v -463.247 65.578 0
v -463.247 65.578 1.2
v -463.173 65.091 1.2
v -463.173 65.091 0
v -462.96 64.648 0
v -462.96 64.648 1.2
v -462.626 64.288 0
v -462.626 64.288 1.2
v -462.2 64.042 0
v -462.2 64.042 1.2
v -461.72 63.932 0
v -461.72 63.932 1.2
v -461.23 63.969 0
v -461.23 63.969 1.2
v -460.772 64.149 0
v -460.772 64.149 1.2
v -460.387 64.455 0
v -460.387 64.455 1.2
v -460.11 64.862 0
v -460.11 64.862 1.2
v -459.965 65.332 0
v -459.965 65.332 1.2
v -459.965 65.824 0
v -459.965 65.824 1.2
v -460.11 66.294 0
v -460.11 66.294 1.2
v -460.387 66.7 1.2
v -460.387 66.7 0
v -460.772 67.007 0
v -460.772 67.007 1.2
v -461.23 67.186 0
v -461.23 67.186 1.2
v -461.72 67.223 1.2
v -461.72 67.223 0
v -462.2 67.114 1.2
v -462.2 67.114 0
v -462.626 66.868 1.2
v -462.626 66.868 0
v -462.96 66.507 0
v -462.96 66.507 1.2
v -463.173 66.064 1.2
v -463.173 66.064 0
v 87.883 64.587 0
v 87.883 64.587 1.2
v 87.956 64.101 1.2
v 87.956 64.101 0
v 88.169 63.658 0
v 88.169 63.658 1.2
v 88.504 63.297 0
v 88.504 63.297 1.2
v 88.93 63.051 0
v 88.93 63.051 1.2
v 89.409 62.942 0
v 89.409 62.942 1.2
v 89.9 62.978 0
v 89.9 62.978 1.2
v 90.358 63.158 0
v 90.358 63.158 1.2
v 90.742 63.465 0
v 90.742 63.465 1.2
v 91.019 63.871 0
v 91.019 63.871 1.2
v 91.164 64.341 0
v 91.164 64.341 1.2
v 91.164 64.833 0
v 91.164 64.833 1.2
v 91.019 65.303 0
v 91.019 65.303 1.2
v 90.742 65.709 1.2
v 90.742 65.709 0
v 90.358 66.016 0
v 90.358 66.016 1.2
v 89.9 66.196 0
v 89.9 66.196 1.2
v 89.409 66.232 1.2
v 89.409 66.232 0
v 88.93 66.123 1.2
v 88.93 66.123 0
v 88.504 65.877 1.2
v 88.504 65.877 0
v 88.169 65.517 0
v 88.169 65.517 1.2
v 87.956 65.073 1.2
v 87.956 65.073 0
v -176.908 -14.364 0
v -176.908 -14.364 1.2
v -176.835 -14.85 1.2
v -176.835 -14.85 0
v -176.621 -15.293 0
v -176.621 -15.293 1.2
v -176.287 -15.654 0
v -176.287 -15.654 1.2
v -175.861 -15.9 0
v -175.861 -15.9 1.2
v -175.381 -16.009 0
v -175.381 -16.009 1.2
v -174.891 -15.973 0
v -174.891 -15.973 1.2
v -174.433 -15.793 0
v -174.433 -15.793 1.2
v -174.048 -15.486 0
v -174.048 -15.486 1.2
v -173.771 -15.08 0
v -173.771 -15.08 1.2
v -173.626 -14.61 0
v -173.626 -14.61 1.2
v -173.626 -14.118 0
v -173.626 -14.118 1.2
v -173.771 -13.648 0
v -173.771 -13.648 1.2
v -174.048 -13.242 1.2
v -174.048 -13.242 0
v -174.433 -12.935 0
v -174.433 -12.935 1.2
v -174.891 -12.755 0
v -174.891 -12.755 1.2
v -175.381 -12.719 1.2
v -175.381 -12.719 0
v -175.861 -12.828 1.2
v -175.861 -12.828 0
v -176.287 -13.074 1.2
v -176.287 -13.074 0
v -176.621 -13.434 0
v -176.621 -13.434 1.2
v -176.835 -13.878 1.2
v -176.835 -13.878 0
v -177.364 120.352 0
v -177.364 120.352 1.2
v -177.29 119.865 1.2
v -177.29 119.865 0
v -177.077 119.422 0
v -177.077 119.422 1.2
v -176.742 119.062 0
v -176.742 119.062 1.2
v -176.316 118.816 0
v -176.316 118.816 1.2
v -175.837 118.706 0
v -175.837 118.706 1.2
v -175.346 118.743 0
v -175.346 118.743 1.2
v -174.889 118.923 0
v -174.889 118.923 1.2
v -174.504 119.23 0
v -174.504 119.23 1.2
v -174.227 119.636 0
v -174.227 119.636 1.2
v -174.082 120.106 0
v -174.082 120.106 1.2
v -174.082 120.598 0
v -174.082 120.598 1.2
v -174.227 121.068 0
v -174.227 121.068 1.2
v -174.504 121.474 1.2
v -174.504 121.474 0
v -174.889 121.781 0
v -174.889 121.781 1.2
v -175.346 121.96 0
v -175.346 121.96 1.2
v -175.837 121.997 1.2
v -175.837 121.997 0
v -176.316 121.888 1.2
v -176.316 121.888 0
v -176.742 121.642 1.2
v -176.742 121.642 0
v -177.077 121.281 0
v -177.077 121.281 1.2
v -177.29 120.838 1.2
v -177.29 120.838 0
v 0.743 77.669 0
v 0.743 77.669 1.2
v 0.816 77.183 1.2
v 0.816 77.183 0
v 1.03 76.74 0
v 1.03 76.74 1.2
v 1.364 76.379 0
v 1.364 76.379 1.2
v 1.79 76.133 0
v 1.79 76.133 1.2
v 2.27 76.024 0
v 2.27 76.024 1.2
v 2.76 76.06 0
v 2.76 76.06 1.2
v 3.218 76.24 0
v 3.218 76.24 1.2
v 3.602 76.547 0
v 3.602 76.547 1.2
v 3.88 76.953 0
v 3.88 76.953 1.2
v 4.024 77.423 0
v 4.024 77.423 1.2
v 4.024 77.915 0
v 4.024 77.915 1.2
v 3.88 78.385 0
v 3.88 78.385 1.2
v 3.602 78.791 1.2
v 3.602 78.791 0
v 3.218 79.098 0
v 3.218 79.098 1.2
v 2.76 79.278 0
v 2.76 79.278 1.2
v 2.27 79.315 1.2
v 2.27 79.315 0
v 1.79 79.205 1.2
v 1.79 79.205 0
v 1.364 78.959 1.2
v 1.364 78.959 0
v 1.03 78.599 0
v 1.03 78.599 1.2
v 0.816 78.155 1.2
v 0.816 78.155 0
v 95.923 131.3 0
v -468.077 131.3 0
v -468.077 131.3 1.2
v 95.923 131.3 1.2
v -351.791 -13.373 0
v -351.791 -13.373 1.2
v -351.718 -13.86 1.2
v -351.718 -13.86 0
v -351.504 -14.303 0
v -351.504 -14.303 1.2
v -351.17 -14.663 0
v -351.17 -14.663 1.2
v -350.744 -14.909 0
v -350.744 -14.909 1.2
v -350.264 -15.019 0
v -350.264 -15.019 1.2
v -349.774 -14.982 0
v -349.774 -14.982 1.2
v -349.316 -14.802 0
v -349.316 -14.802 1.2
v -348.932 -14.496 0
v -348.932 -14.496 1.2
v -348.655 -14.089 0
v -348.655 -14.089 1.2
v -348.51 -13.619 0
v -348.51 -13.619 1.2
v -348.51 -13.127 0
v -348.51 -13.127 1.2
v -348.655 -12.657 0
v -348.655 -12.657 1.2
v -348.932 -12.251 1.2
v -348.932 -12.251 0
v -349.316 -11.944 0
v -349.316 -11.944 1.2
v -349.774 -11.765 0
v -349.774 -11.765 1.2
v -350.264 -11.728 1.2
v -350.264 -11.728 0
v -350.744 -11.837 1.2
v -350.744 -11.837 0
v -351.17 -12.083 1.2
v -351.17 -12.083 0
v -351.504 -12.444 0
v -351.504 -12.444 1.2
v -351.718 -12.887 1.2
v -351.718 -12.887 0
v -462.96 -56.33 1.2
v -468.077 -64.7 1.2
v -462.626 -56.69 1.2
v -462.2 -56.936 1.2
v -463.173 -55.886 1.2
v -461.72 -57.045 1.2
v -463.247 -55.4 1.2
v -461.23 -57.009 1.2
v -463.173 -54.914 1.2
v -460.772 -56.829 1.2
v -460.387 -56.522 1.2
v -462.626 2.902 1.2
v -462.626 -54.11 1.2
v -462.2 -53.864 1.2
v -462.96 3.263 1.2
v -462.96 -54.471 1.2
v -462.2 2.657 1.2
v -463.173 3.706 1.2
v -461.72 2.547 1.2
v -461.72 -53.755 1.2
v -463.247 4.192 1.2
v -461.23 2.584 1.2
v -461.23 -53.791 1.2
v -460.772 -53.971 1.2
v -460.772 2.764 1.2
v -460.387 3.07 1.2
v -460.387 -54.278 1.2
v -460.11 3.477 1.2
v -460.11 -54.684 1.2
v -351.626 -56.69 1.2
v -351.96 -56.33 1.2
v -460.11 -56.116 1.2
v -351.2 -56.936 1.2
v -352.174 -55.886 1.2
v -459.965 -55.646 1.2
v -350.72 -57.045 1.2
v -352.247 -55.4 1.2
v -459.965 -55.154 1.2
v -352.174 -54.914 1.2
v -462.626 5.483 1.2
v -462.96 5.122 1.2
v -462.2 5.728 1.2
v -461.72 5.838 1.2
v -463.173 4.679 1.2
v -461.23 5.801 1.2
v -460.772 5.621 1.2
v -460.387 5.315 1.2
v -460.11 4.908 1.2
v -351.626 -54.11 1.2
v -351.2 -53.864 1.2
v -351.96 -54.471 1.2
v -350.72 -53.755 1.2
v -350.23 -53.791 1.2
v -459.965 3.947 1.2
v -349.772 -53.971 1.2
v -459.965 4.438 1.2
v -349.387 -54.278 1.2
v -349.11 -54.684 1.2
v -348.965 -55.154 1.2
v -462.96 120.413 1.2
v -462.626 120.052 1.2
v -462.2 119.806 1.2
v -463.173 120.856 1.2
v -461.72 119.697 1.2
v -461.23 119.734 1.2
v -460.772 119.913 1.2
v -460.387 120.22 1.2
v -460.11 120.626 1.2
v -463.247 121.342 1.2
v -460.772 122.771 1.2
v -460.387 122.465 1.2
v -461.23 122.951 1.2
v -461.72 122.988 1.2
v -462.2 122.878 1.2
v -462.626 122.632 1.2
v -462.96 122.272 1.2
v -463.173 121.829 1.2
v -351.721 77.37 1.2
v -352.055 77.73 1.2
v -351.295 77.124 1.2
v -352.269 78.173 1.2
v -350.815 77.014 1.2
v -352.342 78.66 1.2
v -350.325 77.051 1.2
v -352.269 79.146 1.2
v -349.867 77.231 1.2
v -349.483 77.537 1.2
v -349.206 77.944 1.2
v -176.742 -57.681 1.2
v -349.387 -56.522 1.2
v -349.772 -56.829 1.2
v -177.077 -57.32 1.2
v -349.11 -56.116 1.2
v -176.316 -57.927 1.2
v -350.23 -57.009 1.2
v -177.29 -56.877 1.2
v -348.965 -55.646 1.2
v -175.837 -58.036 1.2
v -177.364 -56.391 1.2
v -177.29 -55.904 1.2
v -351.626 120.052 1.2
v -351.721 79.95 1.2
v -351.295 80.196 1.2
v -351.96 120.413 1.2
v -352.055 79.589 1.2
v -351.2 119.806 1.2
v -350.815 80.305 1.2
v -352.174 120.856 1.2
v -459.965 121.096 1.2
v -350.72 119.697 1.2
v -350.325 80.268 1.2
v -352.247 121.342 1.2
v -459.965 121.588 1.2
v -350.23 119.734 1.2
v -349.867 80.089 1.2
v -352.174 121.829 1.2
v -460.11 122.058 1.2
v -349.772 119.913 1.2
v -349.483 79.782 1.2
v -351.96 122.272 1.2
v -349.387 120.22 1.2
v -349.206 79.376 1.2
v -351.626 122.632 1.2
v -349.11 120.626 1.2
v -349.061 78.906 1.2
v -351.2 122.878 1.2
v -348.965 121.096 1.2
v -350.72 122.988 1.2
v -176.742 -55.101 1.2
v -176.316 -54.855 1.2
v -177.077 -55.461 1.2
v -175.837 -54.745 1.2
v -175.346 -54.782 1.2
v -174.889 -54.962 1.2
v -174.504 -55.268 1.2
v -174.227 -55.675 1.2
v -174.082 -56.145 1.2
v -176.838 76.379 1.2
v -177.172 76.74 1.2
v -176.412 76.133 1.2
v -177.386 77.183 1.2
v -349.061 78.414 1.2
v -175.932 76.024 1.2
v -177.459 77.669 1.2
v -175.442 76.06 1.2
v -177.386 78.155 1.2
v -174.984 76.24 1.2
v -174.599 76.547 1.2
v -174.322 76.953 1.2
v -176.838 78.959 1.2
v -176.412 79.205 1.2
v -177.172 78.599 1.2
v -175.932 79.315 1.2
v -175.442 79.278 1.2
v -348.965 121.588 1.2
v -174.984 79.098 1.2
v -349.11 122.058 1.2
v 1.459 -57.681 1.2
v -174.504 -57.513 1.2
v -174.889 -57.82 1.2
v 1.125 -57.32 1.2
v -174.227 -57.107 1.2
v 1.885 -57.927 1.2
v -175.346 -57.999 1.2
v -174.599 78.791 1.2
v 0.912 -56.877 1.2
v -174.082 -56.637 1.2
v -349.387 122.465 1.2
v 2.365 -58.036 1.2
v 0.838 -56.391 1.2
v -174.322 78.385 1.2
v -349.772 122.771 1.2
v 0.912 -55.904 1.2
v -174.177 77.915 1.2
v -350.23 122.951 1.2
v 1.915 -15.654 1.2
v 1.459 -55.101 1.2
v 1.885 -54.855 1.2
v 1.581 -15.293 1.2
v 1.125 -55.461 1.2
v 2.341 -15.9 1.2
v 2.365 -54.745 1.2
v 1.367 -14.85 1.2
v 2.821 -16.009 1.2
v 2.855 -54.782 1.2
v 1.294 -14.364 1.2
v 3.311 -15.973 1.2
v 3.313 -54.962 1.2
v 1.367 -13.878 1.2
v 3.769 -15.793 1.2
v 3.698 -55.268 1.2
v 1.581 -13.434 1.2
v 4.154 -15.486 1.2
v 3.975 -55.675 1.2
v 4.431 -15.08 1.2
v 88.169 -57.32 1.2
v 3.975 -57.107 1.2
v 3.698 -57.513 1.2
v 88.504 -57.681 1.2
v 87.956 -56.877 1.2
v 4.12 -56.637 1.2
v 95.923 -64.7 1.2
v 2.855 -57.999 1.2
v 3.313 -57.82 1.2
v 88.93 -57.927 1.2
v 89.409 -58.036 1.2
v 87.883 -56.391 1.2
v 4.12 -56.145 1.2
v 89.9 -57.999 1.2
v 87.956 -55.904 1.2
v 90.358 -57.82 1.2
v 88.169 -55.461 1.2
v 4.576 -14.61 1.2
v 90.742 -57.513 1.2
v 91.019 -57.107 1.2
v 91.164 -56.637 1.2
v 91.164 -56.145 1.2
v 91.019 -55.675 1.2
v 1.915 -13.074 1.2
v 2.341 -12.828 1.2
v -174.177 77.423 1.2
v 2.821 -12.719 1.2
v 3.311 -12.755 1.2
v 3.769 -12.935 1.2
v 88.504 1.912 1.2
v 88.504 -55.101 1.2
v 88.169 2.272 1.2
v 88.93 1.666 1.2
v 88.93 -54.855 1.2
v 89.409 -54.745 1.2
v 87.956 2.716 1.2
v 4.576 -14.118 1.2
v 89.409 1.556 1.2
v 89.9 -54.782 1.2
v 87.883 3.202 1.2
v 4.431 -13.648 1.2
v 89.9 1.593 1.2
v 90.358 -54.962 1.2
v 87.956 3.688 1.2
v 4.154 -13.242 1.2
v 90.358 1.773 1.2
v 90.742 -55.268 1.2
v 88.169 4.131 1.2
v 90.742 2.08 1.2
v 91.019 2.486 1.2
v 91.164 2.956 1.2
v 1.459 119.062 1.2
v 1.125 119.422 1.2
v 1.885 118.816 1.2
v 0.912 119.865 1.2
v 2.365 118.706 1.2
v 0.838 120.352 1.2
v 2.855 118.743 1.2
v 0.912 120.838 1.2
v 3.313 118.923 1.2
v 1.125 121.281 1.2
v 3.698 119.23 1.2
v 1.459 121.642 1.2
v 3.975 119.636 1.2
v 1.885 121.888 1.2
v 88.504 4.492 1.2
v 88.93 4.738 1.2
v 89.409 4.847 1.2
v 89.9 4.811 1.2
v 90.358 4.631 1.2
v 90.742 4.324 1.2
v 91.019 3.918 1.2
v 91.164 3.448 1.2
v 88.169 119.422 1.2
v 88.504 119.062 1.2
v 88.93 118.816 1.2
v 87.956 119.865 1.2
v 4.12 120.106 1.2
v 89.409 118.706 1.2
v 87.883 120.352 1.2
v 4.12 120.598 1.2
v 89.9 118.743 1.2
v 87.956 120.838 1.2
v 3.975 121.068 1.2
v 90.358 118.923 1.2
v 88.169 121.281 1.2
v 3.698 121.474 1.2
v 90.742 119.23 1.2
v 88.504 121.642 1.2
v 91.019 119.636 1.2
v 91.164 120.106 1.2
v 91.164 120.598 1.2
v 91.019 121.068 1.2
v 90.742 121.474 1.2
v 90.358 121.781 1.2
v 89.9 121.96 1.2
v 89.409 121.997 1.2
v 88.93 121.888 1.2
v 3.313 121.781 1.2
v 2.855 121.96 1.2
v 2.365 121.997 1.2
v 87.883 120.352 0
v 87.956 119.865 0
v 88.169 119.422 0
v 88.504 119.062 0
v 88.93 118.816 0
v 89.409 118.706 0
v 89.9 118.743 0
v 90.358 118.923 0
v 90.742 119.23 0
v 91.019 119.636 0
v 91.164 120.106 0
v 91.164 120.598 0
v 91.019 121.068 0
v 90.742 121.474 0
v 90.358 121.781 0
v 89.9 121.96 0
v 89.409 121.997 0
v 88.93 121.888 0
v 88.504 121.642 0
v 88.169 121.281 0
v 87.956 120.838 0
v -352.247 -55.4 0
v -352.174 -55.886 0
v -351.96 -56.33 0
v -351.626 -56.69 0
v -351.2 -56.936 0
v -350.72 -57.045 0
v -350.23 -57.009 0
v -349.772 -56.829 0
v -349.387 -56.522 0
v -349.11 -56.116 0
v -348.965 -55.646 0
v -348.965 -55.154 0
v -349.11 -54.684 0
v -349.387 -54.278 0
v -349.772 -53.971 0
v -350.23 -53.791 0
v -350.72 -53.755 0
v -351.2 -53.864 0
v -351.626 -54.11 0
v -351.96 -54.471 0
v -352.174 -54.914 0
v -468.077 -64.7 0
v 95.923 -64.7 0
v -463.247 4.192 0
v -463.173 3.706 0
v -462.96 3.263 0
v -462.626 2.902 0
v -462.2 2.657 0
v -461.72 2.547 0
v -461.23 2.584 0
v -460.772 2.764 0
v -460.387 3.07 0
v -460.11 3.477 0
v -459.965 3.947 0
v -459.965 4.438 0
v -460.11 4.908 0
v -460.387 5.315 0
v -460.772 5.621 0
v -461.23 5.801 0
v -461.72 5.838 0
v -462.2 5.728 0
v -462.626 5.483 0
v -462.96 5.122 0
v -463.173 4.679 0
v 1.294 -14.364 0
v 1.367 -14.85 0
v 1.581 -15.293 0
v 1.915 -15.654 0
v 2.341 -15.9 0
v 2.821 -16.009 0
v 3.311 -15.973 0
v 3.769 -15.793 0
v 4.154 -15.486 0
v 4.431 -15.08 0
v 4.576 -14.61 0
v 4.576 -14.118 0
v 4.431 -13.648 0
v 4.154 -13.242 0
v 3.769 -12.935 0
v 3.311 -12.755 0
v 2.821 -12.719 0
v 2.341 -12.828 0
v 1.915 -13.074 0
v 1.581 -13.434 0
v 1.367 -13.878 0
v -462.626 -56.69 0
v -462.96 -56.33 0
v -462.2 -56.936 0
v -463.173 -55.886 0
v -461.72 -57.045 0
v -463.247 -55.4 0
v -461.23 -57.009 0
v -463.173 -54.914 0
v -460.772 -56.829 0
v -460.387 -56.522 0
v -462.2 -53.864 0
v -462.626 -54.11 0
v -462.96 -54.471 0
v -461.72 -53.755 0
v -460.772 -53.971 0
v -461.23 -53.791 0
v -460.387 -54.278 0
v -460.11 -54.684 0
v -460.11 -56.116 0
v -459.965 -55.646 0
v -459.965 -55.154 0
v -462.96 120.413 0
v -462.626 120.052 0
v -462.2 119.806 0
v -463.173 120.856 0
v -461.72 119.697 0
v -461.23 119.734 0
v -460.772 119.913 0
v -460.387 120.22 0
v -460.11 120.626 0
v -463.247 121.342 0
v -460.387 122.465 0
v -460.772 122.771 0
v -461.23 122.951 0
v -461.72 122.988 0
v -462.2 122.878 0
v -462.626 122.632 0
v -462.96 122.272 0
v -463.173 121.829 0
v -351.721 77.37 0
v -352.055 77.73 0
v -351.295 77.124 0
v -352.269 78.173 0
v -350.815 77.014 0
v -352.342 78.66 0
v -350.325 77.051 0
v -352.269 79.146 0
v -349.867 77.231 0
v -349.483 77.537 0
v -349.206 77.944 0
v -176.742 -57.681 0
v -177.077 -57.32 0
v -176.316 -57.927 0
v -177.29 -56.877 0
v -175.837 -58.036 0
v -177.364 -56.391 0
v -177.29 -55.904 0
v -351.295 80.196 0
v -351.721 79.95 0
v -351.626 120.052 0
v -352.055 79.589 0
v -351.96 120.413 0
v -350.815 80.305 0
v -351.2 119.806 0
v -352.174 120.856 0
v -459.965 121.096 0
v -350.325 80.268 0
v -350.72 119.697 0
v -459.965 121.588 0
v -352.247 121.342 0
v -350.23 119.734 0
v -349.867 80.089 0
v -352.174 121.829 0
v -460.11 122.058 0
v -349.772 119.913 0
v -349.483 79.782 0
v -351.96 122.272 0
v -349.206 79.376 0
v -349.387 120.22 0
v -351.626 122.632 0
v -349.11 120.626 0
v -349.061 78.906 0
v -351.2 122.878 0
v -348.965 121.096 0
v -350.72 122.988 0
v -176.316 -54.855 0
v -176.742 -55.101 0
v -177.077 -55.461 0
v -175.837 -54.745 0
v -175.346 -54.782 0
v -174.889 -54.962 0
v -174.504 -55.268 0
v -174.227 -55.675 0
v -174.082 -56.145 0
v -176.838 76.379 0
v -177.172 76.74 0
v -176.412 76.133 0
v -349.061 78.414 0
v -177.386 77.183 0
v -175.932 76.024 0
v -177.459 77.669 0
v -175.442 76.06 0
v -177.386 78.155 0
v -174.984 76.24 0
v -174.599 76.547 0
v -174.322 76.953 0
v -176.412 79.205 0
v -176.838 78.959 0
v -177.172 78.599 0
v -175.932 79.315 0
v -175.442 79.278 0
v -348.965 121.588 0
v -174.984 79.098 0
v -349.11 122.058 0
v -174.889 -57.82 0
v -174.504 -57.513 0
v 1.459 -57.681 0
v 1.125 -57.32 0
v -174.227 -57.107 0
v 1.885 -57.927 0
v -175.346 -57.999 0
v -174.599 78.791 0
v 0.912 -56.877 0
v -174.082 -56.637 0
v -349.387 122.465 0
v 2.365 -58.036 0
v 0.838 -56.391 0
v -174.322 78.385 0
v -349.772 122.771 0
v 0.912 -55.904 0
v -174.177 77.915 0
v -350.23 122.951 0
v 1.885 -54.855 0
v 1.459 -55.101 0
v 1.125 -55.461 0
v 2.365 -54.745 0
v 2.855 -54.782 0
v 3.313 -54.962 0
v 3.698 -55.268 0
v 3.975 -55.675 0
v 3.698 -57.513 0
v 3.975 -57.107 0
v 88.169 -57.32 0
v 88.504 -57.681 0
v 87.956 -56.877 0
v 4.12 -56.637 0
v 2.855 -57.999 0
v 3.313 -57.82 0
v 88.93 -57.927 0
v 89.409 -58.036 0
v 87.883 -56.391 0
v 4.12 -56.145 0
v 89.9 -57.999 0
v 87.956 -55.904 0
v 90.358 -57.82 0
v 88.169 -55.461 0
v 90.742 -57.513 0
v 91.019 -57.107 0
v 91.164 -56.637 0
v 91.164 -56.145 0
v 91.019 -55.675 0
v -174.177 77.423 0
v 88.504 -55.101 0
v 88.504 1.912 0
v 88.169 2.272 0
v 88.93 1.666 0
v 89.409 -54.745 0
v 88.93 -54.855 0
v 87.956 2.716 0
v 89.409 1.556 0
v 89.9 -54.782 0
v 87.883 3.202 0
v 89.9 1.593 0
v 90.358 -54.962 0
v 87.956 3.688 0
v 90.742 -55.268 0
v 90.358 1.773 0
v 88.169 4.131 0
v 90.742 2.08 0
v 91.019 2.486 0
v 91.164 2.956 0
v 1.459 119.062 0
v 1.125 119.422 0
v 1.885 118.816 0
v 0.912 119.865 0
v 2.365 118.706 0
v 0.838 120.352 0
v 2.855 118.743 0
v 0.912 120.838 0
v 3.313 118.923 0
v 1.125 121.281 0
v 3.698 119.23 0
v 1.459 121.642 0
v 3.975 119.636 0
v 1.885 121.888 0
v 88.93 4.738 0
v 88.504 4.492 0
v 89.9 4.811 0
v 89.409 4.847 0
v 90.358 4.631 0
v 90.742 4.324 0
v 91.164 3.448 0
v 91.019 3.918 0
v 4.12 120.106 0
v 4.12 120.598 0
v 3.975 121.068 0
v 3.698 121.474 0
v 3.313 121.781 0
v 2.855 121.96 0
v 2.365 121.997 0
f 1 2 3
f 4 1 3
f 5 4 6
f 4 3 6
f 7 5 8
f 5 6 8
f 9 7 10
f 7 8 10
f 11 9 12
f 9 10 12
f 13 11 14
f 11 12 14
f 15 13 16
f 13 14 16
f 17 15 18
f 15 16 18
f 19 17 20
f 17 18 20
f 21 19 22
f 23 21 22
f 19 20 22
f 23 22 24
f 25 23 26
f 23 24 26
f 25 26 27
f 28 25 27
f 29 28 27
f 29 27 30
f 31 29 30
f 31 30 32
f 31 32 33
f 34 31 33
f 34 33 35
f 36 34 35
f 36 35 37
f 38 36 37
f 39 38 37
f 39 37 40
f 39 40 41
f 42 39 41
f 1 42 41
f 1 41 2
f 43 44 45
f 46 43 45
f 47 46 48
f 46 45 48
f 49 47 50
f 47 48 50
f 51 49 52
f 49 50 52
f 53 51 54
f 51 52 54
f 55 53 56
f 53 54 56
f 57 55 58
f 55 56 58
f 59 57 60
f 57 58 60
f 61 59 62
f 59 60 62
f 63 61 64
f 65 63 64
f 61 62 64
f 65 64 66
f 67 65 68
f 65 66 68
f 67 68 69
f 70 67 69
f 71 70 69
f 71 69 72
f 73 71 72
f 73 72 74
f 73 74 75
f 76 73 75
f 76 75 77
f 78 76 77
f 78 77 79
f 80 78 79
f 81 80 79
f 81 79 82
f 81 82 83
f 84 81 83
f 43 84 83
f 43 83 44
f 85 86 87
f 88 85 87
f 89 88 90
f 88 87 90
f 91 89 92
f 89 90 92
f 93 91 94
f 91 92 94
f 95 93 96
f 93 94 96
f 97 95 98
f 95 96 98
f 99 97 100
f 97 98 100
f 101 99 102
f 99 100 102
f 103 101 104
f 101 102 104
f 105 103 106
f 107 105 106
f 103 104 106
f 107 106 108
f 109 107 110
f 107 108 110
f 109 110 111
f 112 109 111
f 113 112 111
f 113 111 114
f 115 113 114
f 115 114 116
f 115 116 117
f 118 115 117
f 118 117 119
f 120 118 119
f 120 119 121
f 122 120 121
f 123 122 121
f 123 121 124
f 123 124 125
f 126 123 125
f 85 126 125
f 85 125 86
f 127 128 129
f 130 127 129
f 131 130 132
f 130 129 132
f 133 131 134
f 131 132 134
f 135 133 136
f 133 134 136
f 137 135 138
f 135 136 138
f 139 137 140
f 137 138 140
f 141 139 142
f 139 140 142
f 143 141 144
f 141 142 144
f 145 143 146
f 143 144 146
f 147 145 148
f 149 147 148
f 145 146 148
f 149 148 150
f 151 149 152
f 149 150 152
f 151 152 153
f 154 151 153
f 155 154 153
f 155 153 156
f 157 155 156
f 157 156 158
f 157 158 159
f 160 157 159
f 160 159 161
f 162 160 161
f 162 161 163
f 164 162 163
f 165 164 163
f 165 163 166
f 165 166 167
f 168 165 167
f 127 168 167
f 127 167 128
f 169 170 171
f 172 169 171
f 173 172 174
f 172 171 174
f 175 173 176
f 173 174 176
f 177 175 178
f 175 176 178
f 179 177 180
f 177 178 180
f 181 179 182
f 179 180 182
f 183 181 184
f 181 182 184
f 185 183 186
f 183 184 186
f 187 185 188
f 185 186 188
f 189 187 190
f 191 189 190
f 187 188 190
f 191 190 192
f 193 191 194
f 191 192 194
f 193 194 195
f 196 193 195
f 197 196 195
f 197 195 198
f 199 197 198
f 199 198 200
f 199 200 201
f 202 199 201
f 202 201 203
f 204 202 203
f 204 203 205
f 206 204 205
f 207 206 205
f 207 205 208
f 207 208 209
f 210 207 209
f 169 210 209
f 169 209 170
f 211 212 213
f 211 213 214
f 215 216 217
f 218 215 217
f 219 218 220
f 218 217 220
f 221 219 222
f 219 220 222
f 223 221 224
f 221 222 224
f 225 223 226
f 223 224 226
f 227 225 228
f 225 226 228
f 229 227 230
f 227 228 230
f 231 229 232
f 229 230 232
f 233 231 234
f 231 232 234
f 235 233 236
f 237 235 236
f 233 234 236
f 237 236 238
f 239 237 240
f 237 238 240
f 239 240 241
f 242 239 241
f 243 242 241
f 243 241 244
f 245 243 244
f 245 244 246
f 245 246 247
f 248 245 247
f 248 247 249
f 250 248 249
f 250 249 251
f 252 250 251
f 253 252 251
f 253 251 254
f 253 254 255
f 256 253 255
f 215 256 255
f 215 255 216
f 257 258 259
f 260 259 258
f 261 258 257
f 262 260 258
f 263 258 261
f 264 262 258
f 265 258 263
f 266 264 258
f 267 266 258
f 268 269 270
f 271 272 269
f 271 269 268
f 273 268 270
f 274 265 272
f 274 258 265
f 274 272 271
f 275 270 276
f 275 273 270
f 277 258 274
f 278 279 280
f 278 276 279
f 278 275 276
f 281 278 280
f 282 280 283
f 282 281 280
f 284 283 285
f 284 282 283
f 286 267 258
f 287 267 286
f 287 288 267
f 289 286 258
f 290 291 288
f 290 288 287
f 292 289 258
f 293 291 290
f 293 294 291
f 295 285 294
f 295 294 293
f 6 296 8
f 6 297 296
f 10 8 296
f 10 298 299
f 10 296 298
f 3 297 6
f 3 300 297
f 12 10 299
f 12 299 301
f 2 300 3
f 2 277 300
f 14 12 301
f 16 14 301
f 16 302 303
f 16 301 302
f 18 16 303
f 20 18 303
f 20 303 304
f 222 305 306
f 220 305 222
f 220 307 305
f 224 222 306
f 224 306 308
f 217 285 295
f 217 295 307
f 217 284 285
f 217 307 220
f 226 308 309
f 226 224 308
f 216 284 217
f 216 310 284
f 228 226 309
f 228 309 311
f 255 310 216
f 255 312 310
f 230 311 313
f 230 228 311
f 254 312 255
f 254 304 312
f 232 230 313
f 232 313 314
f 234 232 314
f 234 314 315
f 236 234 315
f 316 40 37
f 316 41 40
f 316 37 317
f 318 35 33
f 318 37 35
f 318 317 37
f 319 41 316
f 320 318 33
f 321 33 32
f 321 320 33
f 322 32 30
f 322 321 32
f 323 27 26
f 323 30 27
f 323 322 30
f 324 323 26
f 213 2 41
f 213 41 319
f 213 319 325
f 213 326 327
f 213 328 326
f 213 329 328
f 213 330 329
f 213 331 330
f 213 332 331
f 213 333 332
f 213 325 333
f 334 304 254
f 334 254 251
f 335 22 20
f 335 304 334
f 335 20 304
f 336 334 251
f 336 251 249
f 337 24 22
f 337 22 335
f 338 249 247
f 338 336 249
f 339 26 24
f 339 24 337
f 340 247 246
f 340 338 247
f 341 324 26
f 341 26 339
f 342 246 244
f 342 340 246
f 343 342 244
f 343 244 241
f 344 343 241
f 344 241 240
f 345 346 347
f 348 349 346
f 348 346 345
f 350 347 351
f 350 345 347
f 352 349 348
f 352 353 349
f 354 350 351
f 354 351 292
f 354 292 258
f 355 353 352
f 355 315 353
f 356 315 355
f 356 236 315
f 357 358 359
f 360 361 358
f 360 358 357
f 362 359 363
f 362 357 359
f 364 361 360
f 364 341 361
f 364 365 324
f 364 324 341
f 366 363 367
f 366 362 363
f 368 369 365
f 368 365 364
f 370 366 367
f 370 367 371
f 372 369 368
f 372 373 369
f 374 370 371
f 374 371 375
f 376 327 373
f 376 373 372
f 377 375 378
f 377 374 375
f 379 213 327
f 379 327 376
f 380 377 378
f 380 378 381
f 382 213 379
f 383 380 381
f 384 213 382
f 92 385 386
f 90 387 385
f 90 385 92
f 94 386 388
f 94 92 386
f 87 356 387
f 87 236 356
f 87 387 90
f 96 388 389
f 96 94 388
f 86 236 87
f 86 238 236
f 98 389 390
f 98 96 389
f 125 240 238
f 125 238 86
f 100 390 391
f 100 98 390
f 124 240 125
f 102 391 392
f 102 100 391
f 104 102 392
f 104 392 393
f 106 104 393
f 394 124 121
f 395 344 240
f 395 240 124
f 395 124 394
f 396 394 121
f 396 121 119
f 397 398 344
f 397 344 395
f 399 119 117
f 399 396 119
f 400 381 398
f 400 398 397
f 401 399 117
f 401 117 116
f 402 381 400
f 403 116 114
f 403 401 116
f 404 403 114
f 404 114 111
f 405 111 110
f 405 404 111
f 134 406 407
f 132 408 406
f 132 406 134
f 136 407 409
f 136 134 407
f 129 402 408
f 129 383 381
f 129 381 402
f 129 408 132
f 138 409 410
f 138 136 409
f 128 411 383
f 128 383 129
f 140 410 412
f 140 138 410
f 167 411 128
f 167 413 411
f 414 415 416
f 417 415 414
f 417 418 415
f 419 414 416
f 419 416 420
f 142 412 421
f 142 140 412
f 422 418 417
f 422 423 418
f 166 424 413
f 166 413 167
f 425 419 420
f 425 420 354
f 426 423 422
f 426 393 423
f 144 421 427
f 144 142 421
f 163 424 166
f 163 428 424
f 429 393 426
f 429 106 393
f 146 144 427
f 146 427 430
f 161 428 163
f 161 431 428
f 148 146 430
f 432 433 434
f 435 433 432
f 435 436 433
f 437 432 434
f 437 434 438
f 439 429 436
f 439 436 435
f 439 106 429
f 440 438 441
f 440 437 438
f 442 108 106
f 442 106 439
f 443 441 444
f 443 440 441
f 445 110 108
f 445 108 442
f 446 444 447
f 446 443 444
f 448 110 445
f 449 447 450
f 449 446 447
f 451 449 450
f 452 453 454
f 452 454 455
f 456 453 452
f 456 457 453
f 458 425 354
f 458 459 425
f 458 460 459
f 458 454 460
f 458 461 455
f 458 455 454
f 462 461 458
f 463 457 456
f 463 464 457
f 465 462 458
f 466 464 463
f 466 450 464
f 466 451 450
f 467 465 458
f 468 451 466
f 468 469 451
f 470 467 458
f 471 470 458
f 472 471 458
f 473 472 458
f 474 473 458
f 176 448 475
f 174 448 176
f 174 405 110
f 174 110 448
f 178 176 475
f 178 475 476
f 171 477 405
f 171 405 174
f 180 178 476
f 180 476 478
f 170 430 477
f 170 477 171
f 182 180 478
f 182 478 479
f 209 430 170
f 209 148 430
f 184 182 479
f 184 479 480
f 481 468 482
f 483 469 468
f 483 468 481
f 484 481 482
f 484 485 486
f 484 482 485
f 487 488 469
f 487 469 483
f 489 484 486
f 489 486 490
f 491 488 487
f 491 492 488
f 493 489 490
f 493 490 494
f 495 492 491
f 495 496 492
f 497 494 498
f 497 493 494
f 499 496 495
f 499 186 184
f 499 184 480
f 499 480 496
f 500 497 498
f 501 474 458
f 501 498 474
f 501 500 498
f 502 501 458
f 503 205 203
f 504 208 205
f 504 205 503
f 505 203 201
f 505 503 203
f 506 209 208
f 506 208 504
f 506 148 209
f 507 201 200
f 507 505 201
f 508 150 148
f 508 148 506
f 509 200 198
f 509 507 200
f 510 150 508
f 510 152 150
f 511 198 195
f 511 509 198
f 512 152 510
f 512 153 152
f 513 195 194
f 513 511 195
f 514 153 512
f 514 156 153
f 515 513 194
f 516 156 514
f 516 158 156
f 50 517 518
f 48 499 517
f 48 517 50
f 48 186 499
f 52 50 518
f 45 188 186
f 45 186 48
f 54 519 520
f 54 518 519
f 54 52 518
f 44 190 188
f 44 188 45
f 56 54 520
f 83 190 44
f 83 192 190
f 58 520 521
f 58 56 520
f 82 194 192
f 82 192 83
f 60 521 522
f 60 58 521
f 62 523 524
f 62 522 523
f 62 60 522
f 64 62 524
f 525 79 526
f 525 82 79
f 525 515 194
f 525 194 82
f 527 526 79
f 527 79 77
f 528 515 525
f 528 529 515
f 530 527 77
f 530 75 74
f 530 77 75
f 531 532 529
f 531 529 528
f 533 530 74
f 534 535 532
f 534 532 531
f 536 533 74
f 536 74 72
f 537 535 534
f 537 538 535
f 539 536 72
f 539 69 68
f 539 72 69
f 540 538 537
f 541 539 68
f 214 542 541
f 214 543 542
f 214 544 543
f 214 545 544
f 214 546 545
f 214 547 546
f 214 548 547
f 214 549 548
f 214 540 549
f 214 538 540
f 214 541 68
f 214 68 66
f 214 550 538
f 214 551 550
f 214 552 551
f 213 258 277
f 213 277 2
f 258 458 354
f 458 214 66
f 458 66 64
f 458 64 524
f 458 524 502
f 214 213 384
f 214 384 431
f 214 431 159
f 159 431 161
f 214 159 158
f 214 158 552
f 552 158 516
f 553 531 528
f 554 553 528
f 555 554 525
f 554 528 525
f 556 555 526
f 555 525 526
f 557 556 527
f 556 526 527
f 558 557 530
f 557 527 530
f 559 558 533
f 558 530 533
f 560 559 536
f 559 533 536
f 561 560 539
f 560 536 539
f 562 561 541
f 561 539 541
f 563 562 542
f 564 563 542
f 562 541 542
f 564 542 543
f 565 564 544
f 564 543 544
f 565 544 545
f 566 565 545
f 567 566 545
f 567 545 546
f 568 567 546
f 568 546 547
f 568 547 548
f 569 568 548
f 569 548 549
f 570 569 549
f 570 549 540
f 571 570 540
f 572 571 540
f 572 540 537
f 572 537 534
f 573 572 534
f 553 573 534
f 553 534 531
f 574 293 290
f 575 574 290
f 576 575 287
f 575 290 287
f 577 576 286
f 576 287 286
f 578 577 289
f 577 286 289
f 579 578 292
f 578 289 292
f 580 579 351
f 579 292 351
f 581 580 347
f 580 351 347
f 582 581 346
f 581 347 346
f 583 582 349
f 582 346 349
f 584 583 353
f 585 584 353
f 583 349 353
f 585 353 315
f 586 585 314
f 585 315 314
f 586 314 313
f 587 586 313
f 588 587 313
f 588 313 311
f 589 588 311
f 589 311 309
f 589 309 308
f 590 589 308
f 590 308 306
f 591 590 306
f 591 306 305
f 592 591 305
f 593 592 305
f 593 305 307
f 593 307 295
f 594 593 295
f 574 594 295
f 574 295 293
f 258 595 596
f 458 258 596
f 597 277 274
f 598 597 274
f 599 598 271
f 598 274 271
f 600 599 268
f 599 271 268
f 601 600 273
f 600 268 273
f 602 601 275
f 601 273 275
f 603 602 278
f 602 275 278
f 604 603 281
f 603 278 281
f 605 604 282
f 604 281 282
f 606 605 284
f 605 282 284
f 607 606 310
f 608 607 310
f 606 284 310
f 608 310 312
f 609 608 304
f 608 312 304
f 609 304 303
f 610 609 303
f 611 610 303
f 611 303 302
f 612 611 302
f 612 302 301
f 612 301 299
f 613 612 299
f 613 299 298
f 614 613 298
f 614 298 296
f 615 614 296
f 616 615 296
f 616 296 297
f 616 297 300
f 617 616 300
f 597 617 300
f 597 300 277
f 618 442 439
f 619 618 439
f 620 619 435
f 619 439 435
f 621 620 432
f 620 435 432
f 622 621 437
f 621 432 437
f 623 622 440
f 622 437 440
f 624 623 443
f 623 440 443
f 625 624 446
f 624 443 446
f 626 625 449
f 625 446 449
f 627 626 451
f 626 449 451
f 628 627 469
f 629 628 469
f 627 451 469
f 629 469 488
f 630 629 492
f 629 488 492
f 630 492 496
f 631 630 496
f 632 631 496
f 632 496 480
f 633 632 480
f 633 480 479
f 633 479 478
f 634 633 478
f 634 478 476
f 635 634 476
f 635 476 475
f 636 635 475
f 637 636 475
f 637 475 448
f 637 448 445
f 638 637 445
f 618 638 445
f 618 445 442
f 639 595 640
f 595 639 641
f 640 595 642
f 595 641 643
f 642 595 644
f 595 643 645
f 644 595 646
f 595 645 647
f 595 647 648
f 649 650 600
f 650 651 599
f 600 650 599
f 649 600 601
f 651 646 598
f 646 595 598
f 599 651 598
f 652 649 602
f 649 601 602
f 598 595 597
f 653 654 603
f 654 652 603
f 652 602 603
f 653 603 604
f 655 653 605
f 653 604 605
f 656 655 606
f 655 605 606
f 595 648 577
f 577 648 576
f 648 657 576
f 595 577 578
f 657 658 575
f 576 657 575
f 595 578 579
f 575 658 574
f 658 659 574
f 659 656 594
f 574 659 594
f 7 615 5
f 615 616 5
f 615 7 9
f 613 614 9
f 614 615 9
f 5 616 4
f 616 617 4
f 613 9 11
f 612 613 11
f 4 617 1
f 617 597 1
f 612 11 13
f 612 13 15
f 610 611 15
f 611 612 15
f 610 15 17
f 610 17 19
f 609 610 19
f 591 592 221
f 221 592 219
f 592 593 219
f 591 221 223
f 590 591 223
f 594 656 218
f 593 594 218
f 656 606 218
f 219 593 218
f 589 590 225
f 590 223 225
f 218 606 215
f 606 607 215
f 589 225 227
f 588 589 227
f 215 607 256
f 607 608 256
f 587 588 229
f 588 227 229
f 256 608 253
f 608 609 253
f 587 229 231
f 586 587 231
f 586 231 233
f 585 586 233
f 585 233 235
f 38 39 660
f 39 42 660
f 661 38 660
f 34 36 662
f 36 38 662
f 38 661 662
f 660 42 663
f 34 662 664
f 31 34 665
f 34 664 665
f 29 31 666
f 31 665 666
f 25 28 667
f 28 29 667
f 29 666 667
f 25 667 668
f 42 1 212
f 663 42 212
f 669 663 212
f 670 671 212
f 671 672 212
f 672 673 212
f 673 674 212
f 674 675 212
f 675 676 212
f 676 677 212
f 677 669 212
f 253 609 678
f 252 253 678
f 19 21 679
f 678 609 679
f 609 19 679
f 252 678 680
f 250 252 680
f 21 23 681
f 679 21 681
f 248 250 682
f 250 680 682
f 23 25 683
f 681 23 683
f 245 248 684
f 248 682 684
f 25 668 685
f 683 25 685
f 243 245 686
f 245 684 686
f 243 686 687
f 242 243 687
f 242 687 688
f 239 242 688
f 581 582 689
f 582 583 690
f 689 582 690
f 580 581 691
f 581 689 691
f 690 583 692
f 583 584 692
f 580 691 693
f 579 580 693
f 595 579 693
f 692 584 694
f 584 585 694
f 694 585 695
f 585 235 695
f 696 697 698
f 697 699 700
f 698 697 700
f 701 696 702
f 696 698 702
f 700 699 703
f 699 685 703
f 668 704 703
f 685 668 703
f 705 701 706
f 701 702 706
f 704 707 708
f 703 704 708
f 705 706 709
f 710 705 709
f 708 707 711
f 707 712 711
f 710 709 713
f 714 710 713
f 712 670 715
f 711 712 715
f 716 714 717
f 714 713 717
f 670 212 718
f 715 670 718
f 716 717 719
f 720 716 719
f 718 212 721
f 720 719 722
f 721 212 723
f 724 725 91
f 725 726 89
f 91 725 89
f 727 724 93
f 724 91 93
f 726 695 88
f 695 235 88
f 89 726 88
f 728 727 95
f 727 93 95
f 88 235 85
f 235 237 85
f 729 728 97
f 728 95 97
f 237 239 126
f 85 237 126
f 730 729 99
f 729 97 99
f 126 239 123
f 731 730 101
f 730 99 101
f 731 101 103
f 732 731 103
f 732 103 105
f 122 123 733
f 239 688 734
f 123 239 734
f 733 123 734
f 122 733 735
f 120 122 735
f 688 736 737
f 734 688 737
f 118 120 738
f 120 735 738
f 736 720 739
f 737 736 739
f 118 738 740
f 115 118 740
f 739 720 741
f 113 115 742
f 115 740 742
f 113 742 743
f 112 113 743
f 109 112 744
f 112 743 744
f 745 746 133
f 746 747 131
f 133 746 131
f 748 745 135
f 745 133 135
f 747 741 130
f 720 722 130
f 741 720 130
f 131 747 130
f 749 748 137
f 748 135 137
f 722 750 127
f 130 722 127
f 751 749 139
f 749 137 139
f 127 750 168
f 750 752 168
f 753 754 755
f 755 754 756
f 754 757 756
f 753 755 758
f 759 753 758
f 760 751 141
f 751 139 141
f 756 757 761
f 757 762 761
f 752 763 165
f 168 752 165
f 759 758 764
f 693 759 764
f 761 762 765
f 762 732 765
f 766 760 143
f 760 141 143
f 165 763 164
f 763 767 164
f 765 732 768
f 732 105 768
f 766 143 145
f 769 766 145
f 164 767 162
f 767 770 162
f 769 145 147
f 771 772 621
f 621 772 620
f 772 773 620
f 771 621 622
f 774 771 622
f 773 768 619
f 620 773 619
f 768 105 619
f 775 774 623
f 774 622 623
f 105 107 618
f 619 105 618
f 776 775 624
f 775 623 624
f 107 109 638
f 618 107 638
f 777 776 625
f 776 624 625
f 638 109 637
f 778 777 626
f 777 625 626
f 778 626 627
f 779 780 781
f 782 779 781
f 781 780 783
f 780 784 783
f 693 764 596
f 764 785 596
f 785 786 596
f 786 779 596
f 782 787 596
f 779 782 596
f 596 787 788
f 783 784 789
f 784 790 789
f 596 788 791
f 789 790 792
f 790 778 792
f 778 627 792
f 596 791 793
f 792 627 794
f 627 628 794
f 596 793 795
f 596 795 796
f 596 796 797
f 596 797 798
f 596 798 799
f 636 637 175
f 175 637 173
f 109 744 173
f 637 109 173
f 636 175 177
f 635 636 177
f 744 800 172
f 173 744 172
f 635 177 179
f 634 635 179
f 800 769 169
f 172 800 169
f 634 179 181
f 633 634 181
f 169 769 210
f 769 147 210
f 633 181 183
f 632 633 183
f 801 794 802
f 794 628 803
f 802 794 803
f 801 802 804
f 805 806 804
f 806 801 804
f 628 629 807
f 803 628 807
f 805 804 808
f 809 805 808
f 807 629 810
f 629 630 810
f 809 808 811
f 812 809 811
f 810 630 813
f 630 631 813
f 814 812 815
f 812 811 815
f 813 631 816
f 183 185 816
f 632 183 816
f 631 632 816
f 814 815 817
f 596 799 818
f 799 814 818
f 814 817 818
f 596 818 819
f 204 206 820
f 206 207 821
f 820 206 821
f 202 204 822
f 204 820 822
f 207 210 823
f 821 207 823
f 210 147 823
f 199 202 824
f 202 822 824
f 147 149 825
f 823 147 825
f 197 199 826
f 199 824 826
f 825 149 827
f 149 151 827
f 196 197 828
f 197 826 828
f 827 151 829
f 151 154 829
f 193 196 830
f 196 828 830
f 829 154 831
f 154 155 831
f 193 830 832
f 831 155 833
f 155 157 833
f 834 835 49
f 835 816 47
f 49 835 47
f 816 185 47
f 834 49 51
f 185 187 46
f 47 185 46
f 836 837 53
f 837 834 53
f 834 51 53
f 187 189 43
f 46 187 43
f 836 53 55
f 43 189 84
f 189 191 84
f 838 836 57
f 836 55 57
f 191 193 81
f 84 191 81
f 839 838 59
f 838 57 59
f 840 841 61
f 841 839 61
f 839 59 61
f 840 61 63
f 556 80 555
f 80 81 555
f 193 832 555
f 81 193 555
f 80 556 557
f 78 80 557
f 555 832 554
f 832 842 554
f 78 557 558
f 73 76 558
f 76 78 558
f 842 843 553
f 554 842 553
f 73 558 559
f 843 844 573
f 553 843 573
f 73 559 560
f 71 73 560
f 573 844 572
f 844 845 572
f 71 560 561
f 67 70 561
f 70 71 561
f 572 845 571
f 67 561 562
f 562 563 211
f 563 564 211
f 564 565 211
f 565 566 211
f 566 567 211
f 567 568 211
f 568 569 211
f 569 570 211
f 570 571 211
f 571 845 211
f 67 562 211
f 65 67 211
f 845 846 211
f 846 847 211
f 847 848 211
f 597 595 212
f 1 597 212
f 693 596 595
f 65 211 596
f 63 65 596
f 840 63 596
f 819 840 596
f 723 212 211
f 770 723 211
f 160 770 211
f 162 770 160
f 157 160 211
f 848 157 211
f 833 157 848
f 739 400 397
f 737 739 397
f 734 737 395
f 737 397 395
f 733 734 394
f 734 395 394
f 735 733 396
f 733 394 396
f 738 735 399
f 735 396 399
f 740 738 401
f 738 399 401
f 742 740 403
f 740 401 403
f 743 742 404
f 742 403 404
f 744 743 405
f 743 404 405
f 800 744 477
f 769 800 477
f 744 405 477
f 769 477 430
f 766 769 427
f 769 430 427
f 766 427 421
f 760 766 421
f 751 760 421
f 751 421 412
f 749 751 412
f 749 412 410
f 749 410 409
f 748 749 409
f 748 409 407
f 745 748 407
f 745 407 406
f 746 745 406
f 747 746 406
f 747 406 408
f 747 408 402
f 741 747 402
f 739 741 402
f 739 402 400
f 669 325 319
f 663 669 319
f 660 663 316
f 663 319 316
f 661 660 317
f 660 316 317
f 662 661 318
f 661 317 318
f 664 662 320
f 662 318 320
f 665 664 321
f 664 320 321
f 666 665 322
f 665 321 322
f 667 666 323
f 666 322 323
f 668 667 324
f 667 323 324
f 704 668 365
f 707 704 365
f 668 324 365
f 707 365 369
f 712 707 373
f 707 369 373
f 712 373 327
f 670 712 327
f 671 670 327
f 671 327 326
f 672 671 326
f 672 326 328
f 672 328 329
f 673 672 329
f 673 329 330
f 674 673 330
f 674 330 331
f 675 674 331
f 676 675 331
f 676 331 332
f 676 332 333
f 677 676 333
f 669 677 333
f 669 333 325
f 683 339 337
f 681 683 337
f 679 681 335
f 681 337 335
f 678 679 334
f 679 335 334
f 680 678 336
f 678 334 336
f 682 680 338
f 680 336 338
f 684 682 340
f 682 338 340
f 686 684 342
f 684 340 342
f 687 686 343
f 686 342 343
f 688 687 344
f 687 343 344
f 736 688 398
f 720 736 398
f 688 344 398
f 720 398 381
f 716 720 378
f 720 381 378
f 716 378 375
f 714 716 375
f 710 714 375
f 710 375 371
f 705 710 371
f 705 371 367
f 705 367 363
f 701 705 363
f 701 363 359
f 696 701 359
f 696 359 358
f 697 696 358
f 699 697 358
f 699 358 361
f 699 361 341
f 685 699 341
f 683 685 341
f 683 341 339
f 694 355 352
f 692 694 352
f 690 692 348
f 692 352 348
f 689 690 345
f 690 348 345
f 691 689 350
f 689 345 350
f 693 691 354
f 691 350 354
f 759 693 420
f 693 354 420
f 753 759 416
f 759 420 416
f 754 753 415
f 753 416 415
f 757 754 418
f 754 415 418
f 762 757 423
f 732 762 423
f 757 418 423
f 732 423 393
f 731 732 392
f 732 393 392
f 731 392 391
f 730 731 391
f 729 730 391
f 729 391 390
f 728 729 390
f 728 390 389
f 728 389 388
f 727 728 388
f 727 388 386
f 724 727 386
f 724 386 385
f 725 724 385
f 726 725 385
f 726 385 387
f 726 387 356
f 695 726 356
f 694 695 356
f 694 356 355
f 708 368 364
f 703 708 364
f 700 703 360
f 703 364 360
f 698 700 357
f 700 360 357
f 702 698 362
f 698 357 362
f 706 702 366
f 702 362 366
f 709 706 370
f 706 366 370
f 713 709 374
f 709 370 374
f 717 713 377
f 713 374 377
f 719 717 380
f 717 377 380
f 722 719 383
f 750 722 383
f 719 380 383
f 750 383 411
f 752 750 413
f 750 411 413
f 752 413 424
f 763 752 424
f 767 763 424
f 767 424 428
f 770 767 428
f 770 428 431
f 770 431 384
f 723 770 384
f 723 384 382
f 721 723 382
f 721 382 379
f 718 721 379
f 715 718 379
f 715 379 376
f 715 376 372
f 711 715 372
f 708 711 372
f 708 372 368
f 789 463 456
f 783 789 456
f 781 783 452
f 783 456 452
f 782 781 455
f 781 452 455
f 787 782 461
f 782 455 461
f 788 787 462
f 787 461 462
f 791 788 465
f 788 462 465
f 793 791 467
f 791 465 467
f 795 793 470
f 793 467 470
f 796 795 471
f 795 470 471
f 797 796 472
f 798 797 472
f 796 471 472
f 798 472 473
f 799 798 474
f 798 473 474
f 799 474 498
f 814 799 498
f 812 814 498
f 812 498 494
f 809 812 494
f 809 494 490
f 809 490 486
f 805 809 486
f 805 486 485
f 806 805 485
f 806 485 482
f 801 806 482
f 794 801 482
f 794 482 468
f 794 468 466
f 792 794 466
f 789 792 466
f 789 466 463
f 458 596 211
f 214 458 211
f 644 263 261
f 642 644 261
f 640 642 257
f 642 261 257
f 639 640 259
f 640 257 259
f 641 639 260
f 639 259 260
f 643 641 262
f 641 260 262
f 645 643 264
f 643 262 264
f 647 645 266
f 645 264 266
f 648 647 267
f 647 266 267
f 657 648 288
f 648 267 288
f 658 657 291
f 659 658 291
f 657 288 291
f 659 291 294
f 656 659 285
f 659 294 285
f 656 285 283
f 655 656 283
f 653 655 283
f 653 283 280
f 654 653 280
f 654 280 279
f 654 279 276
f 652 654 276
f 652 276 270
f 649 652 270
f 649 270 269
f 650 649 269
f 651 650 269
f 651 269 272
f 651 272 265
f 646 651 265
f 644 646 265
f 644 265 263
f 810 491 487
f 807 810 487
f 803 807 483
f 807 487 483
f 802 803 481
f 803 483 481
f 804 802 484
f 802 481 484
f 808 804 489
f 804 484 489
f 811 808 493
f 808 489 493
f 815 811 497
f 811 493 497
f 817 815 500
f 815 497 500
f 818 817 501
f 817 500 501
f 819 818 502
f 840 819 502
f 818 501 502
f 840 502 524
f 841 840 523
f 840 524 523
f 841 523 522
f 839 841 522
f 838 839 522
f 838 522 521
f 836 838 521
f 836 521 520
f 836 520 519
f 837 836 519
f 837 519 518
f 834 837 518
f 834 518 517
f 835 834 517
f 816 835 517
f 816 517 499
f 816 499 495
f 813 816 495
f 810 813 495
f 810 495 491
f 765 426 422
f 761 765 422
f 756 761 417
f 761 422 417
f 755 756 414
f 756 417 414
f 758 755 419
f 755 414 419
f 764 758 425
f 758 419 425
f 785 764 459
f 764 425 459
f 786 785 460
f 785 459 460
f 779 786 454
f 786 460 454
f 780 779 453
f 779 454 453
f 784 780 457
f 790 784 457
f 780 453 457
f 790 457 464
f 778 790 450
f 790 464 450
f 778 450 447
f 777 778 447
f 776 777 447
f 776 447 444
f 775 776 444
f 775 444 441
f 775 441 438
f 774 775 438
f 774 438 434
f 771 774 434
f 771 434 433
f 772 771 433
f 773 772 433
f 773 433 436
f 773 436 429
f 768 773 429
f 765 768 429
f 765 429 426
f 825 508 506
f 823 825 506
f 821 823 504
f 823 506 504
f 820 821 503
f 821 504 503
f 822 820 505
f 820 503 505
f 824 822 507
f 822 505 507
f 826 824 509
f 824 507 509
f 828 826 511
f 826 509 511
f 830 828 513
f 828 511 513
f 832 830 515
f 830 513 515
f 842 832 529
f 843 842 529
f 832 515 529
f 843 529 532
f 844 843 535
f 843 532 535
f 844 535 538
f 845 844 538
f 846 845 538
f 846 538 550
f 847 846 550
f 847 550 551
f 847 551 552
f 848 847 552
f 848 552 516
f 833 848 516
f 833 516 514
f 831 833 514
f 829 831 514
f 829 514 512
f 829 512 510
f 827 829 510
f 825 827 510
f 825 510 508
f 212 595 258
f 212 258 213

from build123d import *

# Parameters (mm, degrees)
F0_W     = 564
F0_H     = 196
F1_DEPTH = 1.2
F2_D     = 3.3
F2_DEPTH = 5
F2_TIP   = 0.9914200214
F3_D     = 3.3
F3_DEPTH = 5
F3_TIP   = 0.9914200214


with BuildPart() as f1:
    # F0 (on Top) → F1 (new body)
    with BuildSketch(Plane.XY):
        with Locations((-186.0771722794, 33.2998957038)):
            Rectangle(F0_W, F0_H)
    extrude(amount=F1_DEPTH)

    # F2
    with Locations(Plane(origin=(0, 0, 0), x_dir=(1, 0, 0), z_dir=(0, 0, -1))):
        with Locations((-461.5967571735, -121.3424056768)):
            Hole(F2_D / 2, depth=F2_DEPTH)
            with Locations((0, 0, -(F2_DEPTH + F2_TIP / 2))):  # 118° drill point
                Cone(0, F2_D / 2, F2_TIP, mode=Mode.SUBTRACT)

    # F3
    with Locations(Plane(origin=(0, 0, 0), x_dir=(1, 0, 0), z_dir=(0, 0, -1))):
        with Locations((-461.5967571735, -65.577685833), (-461.5967571735, -4.1924929246), (-461.5967571735, 55.4001042962), (-350.59684515, 55.4001042962), (-350.141108036, 13.3732995018), (-350.6921827793, -78.6597281694), (-350.59684515, -121.3424056768), (-175.7135987282, -120.351799798), (-175.8089363575, -77.6691222906), (-175.2578616142, 14.3639053807), (-175.7135987282, 56.390710175), (2.4882517755, 56.390710175), (2.9439888895, 14.3639053807), (2.3929141462, -77.6691222906), (2.4882517755, -120.351799798), (89.5325541496, -120.351798841), (89.5325541496, -64.5870789971), (89.5325541496, -3.2018860888), (89.5325541496, 56.3907111321)):
            Hole(F3_D / 2, depth=F3_DEPTH)
            with Locations((0, 0, -(F3_DEPTH + F3_TIP / 2))):  # 118° drill point
                Cone(0, F3_D / 2, F3_TIP, mode=Mode.SUBTRACT)


solid = f1.part
